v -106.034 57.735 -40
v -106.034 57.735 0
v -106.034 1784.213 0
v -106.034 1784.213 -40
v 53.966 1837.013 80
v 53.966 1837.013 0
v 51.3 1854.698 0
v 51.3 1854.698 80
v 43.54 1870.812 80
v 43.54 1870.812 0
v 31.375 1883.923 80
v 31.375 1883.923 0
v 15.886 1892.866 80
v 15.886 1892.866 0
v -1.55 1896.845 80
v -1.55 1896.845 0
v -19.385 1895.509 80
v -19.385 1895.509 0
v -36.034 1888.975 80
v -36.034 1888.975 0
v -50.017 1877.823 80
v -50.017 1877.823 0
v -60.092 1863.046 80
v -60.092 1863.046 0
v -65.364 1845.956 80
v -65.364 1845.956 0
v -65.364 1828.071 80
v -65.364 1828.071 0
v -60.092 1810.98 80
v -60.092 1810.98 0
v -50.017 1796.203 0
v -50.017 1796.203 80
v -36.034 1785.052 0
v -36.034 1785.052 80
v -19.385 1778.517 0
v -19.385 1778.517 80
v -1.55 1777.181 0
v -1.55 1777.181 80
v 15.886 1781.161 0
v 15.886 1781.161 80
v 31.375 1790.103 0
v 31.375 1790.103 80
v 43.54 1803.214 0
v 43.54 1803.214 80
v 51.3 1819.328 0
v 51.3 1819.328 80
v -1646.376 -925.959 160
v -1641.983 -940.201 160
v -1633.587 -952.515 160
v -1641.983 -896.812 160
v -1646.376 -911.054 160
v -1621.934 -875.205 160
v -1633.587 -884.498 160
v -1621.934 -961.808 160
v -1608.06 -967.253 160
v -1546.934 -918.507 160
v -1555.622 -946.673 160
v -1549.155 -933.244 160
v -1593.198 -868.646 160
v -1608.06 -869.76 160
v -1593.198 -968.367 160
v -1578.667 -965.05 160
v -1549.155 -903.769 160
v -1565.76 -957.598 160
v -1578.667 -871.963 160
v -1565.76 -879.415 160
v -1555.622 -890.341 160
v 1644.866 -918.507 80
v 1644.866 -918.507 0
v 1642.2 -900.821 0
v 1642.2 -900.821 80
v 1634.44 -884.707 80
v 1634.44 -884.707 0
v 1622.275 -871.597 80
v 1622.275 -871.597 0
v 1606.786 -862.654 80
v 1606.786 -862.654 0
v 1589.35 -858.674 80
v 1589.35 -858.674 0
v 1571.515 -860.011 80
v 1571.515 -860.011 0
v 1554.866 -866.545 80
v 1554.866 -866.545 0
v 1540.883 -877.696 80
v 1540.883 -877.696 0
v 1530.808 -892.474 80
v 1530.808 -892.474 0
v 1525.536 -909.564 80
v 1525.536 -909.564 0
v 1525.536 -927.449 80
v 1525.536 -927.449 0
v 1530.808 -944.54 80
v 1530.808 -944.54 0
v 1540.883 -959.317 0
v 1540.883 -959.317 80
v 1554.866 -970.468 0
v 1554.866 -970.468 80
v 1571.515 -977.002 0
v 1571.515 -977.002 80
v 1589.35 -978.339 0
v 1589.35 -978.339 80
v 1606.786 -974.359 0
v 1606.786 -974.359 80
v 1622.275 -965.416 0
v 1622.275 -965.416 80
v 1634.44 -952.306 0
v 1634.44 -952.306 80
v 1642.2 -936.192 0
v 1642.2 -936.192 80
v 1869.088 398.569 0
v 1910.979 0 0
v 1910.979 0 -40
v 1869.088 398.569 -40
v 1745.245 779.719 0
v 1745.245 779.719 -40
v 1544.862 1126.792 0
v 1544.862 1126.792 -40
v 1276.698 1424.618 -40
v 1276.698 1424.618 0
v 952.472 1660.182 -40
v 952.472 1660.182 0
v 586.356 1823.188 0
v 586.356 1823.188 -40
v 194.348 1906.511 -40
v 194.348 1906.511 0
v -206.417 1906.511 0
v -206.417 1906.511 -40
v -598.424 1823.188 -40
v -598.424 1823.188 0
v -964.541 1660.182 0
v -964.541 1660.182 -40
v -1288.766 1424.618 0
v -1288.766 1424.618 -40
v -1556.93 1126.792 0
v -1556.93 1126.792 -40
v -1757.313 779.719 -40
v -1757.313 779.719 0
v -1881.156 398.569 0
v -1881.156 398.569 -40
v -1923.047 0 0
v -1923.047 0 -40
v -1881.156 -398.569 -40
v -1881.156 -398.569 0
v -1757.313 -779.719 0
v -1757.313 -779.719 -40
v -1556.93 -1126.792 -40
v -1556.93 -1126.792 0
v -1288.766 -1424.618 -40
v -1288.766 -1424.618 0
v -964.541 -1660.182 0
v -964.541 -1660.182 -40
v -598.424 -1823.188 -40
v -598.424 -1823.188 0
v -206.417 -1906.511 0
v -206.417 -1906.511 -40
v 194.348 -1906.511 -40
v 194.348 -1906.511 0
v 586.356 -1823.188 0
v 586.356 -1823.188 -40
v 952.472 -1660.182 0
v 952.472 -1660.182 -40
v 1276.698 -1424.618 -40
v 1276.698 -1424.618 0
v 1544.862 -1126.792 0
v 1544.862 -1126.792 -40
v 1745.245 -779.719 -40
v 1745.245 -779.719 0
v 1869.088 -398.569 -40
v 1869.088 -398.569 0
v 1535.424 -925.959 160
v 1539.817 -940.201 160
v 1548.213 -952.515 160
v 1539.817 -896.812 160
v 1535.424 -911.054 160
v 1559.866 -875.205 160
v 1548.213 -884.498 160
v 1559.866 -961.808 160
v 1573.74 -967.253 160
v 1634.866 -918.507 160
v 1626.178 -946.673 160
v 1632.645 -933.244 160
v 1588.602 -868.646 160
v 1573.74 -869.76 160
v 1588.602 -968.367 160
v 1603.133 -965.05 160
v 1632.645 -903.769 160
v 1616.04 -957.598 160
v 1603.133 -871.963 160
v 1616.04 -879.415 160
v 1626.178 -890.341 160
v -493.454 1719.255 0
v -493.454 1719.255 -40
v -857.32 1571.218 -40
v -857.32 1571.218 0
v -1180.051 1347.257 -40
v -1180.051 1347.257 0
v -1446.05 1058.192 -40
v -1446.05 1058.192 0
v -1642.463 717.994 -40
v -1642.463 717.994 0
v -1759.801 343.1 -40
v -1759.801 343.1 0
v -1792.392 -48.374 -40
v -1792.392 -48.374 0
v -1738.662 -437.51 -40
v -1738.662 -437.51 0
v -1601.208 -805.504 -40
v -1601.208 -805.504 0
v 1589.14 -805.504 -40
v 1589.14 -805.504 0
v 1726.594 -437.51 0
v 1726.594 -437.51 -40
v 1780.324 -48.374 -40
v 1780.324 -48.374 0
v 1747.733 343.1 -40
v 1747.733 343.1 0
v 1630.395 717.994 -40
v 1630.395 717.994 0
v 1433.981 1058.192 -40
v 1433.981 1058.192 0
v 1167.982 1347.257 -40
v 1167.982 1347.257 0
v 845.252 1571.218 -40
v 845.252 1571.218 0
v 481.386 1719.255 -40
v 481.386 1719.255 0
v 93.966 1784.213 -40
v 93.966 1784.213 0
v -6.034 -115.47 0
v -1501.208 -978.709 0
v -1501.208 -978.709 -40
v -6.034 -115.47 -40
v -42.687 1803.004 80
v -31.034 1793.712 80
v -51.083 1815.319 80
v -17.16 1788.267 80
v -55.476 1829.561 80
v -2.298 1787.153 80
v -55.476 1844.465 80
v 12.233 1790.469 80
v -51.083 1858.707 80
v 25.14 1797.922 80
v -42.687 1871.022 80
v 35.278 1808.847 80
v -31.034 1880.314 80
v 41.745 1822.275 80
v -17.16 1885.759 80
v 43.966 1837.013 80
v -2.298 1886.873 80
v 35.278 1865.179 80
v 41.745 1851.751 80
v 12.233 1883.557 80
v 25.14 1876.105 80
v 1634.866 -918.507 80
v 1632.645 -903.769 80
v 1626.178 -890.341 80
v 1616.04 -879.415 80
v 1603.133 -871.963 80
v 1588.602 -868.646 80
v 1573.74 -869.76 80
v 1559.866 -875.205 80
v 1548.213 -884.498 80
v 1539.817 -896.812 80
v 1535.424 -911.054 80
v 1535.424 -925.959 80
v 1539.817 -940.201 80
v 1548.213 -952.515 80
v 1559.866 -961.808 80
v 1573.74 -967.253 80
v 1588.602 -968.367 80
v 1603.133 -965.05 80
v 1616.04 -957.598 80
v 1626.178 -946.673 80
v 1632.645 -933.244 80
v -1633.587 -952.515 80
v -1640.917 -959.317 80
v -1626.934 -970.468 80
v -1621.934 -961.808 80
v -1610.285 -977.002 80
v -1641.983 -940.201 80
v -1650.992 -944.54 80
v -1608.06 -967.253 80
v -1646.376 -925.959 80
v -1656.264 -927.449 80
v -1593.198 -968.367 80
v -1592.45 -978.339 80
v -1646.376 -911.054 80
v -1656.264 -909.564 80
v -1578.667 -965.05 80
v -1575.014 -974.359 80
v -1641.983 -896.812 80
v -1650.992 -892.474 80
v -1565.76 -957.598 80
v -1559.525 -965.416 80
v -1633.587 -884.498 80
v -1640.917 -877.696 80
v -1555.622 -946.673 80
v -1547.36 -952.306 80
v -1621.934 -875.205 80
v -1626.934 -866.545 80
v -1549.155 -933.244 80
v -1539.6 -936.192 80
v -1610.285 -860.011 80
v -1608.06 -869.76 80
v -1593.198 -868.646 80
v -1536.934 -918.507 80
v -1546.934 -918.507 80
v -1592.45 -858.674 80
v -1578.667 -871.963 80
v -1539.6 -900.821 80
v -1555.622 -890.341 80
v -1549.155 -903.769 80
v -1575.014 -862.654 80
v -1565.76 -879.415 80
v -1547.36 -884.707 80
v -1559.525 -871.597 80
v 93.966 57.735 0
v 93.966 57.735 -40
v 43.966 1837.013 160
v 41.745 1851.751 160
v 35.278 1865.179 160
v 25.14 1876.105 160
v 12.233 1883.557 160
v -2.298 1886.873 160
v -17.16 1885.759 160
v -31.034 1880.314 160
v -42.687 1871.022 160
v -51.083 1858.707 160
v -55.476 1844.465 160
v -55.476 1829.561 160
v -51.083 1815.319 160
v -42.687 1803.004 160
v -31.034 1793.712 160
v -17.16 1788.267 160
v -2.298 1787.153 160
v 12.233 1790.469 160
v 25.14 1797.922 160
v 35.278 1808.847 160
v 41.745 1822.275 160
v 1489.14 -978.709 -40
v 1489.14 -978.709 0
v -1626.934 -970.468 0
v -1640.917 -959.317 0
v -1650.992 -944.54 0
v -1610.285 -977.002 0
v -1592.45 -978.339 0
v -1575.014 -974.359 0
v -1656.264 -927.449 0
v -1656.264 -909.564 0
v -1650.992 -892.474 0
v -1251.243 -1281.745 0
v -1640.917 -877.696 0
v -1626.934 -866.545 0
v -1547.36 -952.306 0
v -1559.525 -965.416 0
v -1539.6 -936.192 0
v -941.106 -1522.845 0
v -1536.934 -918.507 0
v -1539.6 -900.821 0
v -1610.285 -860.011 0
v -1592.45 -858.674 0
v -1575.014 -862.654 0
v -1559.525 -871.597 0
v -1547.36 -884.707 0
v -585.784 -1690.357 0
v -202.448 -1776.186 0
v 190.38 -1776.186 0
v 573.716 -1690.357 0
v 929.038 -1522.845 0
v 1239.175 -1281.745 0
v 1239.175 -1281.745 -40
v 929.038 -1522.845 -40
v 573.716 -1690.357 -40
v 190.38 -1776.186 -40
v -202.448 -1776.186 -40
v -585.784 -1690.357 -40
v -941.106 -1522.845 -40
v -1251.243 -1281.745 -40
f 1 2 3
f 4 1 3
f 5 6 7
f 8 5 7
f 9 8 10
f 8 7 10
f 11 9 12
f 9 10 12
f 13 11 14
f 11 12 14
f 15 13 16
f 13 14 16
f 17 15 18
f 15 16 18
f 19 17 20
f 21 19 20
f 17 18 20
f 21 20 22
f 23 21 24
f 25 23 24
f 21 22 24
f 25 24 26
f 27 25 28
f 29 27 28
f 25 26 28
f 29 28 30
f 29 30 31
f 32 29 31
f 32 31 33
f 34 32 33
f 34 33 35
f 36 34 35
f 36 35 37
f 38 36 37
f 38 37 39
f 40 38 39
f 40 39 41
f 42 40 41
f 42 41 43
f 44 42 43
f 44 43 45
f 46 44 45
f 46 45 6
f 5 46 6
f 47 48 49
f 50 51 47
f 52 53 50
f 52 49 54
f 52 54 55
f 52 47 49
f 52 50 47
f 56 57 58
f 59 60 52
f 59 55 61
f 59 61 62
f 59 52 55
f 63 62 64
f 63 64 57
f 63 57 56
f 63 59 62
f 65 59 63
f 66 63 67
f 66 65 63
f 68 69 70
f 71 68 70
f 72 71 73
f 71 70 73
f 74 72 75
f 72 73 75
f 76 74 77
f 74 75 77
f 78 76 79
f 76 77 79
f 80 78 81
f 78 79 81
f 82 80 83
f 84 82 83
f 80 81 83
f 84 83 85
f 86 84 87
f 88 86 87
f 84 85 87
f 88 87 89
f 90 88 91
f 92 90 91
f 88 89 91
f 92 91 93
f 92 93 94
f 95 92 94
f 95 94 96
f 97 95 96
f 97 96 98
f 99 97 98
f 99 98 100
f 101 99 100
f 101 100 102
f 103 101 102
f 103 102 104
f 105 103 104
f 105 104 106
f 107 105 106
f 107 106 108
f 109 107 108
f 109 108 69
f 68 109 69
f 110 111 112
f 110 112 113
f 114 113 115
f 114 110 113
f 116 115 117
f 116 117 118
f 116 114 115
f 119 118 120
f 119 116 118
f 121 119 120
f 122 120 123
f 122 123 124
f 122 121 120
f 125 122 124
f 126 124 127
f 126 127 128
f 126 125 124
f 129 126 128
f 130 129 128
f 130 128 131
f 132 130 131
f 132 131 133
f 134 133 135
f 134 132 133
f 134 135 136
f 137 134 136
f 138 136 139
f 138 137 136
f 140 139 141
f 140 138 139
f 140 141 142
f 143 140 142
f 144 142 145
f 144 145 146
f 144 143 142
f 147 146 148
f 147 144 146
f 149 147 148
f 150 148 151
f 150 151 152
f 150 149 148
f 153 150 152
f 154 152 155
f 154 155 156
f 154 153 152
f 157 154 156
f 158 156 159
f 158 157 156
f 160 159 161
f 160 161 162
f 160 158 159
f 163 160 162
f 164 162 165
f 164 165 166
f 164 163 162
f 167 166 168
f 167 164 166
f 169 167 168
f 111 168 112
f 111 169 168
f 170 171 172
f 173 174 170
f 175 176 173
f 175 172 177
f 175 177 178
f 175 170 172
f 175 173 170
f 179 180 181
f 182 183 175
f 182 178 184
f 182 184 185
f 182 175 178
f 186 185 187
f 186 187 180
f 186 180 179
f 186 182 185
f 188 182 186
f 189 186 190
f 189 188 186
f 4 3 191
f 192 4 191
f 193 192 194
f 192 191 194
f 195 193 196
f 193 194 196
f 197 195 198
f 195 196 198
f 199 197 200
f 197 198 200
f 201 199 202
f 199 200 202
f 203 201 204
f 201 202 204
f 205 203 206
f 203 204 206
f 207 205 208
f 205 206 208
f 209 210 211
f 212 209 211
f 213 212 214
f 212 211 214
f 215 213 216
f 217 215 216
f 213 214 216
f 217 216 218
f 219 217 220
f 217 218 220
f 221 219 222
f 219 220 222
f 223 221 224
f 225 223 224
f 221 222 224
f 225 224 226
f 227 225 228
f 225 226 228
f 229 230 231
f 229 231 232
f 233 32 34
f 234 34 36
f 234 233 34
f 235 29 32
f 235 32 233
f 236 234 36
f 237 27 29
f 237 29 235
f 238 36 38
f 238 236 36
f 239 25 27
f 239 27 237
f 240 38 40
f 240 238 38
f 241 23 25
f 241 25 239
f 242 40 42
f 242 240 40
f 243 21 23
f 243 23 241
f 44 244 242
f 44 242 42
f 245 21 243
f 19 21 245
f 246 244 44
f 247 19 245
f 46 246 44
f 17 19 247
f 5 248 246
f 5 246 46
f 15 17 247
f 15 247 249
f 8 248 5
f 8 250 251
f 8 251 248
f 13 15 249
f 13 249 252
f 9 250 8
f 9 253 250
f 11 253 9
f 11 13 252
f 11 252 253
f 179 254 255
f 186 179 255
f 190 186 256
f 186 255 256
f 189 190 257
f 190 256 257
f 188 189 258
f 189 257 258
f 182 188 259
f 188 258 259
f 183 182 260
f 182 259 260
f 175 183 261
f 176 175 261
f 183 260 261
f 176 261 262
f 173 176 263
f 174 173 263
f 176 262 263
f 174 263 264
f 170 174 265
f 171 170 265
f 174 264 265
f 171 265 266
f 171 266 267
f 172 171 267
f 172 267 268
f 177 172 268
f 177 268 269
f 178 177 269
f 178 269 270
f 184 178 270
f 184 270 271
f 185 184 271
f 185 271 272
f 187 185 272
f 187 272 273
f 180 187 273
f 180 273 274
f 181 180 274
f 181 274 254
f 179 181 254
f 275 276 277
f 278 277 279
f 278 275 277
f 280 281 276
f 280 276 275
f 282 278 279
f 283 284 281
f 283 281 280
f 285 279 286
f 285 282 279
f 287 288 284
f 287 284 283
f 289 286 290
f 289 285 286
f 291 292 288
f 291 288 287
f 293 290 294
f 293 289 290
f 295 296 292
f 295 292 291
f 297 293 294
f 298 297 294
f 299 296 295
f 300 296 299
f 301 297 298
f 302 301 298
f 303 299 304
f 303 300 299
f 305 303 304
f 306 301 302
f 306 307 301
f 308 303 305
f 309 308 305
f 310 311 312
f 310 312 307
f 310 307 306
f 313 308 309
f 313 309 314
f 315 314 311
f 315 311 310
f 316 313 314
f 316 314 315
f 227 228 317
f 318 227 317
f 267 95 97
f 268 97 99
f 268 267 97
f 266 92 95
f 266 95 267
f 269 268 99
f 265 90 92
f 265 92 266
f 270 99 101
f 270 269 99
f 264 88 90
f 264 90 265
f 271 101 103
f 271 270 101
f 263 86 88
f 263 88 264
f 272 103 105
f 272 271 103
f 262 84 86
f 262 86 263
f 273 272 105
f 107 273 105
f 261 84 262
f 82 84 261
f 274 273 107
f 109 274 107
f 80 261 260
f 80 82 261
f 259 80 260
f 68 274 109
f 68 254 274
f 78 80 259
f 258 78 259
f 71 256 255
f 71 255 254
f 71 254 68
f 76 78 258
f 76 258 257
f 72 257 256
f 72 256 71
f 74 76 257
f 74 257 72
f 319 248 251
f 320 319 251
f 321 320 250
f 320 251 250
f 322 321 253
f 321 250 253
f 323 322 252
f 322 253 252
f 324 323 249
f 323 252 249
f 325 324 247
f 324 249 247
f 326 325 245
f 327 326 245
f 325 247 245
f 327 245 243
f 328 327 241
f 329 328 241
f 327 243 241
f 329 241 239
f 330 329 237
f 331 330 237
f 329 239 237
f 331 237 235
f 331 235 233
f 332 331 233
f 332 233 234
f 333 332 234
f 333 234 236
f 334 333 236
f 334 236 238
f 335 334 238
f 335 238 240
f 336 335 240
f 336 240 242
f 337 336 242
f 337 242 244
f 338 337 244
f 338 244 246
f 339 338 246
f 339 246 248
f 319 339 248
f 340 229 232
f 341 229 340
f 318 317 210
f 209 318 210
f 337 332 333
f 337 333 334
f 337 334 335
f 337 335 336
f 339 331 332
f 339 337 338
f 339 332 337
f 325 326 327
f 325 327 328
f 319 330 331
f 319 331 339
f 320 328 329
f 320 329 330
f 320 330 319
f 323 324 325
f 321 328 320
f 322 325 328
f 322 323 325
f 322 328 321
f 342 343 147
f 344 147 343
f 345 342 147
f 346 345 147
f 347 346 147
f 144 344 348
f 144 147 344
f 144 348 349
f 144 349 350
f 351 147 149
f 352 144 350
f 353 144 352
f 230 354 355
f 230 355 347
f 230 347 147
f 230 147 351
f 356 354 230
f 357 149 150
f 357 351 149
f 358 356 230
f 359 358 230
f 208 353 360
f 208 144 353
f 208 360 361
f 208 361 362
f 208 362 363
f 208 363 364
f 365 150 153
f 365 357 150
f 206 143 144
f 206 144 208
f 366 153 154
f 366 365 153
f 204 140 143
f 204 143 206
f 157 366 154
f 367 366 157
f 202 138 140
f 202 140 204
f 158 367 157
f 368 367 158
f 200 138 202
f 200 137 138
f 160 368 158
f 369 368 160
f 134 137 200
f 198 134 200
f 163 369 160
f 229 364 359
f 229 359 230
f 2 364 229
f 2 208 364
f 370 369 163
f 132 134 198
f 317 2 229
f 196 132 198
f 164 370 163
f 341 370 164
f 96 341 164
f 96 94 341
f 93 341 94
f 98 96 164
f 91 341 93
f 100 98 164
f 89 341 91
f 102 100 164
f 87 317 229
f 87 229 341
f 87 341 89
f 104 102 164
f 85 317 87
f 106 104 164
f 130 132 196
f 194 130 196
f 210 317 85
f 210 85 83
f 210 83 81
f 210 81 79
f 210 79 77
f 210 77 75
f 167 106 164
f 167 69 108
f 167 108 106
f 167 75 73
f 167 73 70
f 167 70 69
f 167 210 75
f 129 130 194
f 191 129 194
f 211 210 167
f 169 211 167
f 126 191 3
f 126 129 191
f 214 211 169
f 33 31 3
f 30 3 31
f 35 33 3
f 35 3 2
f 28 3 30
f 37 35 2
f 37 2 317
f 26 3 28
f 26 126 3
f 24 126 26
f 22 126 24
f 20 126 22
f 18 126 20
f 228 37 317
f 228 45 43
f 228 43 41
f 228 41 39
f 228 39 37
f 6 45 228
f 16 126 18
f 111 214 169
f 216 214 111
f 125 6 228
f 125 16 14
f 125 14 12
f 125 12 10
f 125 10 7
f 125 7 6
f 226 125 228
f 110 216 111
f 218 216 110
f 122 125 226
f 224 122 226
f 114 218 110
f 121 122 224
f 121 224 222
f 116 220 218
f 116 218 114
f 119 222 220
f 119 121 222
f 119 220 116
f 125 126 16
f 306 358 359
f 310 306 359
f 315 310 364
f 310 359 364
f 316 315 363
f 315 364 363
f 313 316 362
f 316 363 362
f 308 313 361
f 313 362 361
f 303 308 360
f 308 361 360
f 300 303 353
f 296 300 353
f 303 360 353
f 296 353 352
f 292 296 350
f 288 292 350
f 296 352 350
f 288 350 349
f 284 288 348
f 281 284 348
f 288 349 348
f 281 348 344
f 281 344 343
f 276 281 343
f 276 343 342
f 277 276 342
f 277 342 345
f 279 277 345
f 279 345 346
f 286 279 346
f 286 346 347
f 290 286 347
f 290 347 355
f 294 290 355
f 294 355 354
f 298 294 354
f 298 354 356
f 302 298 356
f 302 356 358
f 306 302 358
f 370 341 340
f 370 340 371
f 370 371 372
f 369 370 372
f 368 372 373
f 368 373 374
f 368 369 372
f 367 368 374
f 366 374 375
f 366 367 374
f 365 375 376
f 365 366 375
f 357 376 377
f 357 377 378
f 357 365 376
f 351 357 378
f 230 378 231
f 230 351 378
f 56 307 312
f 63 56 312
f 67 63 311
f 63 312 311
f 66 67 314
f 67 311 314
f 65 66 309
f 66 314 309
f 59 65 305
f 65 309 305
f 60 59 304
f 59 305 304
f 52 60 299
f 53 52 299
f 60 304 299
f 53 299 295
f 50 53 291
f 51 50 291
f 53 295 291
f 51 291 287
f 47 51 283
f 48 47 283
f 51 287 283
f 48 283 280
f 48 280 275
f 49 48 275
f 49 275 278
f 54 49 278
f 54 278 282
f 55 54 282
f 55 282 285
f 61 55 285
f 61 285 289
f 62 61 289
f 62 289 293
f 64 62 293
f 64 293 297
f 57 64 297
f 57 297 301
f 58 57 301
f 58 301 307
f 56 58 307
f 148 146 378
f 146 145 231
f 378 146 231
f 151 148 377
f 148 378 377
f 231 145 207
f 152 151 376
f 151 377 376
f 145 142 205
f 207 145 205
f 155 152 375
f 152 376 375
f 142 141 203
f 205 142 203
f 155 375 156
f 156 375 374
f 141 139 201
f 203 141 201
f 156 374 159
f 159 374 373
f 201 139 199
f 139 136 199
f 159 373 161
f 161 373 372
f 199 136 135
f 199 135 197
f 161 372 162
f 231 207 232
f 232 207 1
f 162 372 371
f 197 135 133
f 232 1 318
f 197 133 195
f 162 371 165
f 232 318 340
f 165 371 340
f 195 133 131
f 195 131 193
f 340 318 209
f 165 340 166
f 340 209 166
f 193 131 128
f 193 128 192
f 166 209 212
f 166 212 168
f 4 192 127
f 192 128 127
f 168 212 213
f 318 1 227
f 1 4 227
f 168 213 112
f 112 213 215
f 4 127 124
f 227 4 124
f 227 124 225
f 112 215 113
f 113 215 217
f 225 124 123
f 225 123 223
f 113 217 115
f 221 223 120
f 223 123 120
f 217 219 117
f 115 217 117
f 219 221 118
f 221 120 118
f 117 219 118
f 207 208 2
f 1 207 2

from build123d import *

# Parameters (mm, degrees)
SKETCH1_R                = 1917.013086508
BOSS_EXTRUDE1_DEPTH      = 40
SKETCH1_4_R              = 50
BOSS_EXTRUDE2_DEPTH      = 160
BOSS_EXTRUDE3_DEPTH      = 80
BOSS_EXTRUDE3_DEPTH_BACK = 10
SKETCH1_5_R              = 60


with BuildPart() as part:
    # Sketch1 → Boss-Extrude1 (new body)
    with BuildSketch(Plane.XY):
        with Locations((-6.034074555, 0)):
            Circle(SKETCH1_R)
        with BuildLine():
            ThreePointArc((93.965925445, 1784.212927694), (1541.564655256, 893.506543254), (1589.139646589, -805.503923468))
            Line((1589.139646589, -805.503923468), (93.965925445, 57.735026919))
            Line((93.965925445, 57.735026919), (93.965925445, 1784.212927694))
        make_face(mode=Mode.SUBTRACT)
        with BuildLine():
            Line((-106.034074555, 1784.212927694), (-106.034074555, 57.735026919))
            Line((-106.034074555, 57.735026919), (-1601.207795698, -805.503923468))
            ThreePointArc((-1601.207795698, -805.503923468), (-1553.632804365, 893.506543254), (-106.034074555, 1784.212927694))
        make_face(mode=Mode.SUBTRACT)
        with BuildLine():
            Line((-1501.207795698, -978.709004225), (-6.034074555, -115.470053838))
            Line((-6.034074555, -115.470053838), (1489.139646589, -978.709004225))
            ThreePointArc((1489.139646589, -978.709004225), (-6.034074555, -1787.013086508), (-1501.207795698, -978.709004225))
        make_face(mode=Mode.SUBTRACT)
    extrude(amount=-BOSS_EXTRUDE1_DEPTH)

    # Sketch1<4> → Boss-Extrude2 (add)
    with BuildSketch(Plane.XY):
        with Locations((1584.865925445, -918.506543254)):
            Circle(SKETCH1_4_R)
        with Locations((-1596.934074555, -918.506543254)):
            Circle(SKETCH1_4_R)
        with Locations((-6.034074555, 1837.013086508)):
            Circle(SKETCH1_4_R)
    extrude(amount=BOSS_EXTRUDE2_DEPTH)

    # Sketch1<5> → Boss-Extrude3 (add, two sides: drawn at the far end of the back side and taken through both)
    with BuildSketch(Plane.XY.offset(-BOSS_EXTRUDE3_DEPTH_BACK)):
        with Locations((-1596.934074555, -918.506543254)):
            Circle(SKETCH1_5_R)
        with Locations((-6.034074555, 1837.013086508)):
            Circle(SKETCH1_5_R)
        with Locations((1584.865925445, -918.506543254)):
            Circle(SKETCH1_5_R)
    extrude(amount=BOSS_EXTRUDE3_DEPTH + BOSS_EXTRUDE3_DEPTH_BACK)


solid = part.part
